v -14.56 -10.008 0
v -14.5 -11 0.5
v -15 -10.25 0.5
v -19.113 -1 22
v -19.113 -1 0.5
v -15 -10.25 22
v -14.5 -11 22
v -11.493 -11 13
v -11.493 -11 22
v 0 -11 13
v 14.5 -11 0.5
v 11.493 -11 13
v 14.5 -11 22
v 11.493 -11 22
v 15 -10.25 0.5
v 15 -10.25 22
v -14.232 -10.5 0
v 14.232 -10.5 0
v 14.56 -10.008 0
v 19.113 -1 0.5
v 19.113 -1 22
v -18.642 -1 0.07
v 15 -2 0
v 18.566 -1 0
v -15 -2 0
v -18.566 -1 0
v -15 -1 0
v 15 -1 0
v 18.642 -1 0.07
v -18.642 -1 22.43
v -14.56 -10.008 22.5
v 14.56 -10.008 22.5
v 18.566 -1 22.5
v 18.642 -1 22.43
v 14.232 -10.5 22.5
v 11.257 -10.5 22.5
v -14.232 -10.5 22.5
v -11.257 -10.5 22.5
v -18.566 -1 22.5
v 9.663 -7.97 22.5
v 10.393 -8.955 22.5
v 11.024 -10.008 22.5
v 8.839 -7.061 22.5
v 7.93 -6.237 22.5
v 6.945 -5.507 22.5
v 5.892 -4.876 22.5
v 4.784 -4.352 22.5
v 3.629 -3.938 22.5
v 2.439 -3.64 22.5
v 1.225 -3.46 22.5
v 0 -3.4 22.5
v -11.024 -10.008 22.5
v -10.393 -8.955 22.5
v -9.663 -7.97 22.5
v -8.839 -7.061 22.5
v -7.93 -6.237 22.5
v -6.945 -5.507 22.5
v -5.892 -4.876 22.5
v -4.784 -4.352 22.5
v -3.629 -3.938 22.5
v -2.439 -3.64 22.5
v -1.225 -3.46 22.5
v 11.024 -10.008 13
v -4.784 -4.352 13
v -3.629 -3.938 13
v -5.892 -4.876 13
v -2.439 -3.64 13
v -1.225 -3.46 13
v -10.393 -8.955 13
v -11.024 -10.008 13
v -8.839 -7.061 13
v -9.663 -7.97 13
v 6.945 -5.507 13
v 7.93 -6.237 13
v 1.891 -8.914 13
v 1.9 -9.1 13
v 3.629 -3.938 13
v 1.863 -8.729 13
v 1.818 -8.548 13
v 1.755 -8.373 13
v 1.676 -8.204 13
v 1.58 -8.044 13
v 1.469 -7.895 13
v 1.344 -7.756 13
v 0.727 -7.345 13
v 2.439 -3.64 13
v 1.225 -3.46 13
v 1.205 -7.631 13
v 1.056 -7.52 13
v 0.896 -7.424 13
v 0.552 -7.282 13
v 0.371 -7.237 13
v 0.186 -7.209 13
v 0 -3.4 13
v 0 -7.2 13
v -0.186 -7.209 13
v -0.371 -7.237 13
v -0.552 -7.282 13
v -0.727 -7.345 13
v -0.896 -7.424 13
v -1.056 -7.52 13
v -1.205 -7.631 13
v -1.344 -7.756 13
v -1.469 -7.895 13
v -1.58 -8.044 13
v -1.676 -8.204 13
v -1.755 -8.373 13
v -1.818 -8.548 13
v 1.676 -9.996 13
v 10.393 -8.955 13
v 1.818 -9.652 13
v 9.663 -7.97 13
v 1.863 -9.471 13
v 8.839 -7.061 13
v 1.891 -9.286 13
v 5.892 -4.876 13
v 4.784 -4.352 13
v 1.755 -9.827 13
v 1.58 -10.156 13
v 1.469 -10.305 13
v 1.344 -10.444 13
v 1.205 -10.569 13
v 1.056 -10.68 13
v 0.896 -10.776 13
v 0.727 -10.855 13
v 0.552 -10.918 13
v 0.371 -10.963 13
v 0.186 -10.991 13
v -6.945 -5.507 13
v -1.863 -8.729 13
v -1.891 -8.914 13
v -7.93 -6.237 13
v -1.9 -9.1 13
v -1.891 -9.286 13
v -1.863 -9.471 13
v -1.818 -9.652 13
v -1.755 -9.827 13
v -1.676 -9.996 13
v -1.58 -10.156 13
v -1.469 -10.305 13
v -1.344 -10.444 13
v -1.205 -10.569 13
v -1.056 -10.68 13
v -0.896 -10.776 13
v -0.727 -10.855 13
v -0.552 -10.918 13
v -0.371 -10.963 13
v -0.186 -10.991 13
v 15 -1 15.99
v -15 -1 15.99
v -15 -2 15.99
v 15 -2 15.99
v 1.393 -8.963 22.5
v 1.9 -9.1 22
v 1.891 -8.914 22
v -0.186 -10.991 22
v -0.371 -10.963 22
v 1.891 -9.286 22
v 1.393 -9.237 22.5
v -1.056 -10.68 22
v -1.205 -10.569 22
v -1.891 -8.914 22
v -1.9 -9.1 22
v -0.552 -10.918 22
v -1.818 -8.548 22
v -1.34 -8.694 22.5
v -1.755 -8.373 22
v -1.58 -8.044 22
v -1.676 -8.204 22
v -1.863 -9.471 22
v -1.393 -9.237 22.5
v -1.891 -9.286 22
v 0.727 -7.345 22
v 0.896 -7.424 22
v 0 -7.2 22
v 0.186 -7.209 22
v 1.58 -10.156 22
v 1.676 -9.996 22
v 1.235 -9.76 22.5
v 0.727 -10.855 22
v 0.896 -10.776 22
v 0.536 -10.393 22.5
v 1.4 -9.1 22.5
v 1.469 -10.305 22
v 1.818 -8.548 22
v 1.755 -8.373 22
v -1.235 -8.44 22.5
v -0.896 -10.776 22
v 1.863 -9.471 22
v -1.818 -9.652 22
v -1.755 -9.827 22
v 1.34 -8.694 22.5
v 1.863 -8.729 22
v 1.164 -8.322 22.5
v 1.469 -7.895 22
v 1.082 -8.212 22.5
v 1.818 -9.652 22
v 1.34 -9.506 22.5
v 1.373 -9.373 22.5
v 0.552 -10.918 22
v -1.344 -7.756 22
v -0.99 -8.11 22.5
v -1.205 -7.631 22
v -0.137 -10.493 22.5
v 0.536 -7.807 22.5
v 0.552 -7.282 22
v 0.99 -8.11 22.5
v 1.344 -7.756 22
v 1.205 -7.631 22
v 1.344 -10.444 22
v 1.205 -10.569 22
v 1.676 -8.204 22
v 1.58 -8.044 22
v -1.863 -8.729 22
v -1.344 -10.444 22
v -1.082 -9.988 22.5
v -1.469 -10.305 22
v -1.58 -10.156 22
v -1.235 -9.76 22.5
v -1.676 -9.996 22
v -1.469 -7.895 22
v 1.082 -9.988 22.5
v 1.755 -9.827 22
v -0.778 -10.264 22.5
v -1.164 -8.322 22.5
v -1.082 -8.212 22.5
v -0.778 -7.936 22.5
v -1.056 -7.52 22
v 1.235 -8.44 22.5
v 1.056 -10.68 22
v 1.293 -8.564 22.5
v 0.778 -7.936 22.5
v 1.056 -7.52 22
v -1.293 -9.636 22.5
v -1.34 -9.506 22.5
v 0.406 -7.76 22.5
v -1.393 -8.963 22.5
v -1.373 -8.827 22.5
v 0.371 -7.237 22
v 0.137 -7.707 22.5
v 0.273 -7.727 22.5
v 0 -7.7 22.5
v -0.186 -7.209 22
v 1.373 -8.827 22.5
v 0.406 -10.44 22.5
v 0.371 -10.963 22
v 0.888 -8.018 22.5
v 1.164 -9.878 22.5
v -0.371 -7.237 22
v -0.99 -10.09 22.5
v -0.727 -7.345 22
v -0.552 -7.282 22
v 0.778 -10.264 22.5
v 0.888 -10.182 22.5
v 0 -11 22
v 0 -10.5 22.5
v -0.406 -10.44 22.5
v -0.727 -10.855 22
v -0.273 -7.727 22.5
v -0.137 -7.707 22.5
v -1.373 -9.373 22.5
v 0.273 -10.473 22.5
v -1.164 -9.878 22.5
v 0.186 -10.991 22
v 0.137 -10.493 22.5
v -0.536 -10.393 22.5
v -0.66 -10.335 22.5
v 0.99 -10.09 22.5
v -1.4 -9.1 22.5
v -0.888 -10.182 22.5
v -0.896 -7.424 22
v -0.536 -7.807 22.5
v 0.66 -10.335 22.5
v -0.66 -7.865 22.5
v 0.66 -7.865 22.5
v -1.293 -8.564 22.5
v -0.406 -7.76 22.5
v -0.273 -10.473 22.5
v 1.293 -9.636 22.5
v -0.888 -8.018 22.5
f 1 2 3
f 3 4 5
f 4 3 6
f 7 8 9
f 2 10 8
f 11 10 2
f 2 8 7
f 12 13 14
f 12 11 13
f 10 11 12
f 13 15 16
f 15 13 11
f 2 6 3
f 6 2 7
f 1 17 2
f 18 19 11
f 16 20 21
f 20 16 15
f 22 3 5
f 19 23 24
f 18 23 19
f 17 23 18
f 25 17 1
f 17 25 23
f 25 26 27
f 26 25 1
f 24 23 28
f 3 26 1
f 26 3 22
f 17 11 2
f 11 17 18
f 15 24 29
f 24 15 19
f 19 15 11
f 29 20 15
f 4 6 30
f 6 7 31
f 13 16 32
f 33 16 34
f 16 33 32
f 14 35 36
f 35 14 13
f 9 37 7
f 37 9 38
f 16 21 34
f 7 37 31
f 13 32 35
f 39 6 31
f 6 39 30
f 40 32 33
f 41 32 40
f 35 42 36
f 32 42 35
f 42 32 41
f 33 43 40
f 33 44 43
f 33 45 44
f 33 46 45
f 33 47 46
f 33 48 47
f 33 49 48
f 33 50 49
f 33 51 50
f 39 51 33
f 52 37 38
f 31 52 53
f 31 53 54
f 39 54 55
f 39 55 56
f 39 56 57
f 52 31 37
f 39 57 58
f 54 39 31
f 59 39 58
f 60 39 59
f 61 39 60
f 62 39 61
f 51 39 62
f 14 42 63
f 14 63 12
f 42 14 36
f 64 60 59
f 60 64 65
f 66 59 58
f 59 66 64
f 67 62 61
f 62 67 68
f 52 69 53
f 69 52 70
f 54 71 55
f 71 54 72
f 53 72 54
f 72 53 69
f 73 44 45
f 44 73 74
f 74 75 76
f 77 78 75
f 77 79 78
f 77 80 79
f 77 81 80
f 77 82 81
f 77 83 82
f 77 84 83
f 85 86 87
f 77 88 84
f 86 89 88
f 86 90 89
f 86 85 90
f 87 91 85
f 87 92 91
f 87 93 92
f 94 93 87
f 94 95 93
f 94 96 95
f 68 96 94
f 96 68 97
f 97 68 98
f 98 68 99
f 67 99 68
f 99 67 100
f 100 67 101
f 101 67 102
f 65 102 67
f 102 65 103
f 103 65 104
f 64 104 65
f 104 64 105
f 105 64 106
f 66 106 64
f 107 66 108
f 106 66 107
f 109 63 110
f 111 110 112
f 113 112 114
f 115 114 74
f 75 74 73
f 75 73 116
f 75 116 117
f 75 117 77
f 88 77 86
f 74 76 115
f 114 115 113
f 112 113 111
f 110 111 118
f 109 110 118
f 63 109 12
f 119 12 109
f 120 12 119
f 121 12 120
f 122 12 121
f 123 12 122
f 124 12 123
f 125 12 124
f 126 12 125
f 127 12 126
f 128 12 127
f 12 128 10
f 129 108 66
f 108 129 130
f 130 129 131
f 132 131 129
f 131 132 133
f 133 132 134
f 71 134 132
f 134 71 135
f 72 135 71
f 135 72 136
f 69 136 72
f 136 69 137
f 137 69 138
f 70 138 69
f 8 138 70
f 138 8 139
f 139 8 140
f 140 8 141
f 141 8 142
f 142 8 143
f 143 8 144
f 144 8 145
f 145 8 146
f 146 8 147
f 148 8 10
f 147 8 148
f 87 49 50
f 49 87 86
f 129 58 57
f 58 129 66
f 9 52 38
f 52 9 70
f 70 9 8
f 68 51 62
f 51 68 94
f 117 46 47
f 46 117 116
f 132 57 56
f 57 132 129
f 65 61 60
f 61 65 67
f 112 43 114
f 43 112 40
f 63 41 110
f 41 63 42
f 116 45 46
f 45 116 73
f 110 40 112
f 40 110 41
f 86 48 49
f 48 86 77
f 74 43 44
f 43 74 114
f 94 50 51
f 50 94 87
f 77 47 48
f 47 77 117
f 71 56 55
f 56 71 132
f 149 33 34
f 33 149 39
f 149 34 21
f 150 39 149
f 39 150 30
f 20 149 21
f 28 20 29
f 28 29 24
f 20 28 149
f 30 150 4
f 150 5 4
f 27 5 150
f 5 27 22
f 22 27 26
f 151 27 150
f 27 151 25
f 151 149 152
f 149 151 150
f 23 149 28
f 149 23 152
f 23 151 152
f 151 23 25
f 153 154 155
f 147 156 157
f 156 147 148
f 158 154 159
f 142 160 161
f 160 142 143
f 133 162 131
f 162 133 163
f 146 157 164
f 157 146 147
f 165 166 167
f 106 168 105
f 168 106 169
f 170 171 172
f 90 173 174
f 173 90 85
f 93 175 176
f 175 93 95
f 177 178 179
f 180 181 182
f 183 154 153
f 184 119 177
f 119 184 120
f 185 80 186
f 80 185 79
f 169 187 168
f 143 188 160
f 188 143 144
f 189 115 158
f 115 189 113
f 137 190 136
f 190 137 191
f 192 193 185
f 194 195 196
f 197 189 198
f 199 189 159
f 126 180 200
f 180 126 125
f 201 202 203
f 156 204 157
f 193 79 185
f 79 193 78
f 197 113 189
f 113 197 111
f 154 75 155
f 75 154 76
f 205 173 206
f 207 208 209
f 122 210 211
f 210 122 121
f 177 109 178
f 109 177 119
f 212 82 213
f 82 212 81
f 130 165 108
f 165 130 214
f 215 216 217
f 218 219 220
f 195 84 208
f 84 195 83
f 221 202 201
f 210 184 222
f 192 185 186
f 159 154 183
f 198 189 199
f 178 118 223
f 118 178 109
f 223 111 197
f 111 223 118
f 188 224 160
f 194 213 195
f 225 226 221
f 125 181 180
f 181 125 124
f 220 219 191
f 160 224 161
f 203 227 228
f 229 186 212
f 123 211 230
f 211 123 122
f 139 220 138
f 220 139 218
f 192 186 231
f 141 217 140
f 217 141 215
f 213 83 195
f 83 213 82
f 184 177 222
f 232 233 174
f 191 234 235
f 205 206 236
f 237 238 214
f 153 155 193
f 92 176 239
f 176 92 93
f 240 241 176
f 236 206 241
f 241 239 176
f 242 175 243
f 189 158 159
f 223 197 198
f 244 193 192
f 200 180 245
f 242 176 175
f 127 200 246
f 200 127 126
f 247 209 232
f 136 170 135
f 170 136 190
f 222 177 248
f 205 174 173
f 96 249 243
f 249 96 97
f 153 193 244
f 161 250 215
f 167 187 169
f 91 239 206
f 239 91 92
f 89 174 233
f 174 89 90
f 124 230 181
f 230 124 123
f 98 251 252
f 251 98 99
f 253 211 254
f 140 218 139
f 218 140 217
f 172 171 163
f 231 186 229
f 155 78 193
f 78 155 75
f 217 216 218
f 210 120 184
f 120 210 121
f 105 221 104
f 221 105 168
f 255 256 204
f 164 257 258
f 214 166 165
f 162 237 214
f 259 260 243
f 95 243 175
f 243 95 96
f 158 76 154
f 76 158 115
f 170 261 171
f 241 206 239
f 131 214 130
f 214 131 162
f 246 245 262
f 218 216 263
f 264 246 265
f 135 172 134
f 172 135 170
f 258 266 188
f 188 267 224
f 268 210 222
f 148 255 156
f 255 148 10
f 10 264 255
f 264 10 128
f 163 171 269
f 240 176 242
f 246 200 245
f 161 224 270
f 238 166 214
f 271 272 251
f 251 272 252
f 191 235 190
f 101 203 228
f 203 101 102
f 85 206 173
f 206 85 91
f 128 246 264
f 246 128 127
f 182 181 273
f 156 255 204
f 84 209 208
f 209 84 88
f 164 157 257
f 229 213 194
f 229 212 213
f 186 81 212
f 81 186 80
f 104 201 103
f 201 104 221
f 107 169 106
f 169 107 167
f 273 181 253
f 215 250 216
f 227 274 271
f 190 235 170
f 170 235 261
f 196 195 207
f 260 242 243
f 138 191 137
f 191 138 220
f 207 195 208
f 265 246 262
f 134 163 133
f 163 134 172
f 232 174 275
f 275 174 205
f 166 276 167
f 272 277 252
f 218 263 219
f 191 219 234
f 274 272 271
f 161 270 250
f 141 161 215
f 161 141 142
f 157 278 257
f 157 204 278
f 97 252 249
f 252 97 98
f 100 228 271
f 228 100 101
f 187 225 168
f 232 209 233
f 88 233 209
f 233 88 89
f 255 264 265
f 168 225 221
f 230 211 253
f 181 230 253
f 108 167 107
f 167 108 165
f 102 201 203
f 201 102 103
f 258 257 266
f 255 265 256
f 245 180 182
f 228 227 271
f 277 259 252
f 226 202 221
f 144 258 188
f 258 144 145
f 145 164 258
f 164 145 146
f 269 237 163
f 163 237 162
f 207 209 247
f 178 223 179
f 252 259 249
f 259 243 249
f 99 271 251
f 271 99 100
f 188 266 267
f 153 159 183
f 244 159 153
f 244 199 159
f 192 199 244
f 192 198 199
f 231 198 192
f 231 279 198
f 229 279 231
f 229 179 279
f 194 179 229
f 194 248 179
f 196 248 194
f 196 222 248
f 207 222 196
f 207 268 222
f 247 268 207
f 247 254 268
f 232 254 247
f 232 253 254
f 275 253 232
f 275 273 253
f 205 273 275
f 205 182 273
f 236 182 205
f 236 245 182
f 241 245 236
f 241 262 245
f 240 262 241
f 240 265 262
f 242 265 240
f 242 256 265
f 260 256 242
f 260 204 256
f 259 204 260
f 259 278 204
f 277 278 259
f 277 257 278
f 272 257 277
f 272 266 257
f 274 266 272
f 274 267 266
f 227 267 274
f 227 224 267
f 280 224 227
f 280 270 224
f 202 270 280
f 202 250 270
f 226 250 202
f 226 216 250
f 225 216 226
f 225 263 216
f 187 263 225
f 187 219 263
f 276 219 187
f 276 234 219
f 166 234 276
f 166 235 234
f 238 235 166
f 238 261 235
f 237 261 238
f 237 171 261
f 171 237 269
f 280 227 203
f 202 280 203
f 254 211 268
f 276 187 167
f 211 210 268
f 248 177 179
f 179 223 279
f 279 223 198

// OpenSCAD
// Towhook Module (Playmobil compatible) for Toy Transporter
// https://www.thingiverse.com/thing:3526023
// by Bikecyclist: 
// https://www.thingiverse.com/Bikecyclist
//
// Remix of/suitable for:
// Toy-Transporter
// https://www.thingiverse.com/thing:3449335
// by Schwiizer:
// https://www.thingiverse.com/Schwiizer

// Depth of the towhook module
dpt = 11;

// Small distance to ensure proper meshing
eps = 0.01;

// Diameter of cutout
d_cutout = 25;

// Diameter of hook
d_hook = 3.8;

// Length of hook
l_hook = 9.5;

// Distance the hook is behind the back plate
y_hook = 11;

// Height of hook
h_hook = 13;

// Extra width of the mounting block at the back of the truck
xw = 10;

// Total height of the mounting block
hh = 21.5;

// Number of facets
$fn = 64;

rotate ([0, 0, 180])
towhook ();

module towhook ()
{
    {
        difference ()
        {
            union ()
            {
                hull ()
                {
                    towblock (hh, xw);
                    
                    linear_extrude (eps)
                    offset (-0.5)
                    projection (cut = false)
                    towblock (hh, xw);
                }
                
                hull ()
                {
                    towblock (hh, xw);
                    
                    translate ([0, 0, hh - eps + 1])
                    linear_extrude (eps)
                    offset (-0.5)
                    projection (cut = true)
                    translate ([0, 0, -hh + eps])
                    towblock (hh, xw);
                }
            }
            
            translate ([0, d_cutout/2 + y_hook - 2 * d_hook, h_hook])
            cylinder (d = d_cutout, h = l_hook + eps);
            
            translate ([0, -1, h_hook - eps])
            cube ([32 + xw + 2 * eps, 4, 26], center = true);
            
            translate ([0, 0, 16/2 - eps])
            cube ([30, 4, 16], center = true);
        }
        
        hull ()
        {
            translate ([0, y_hook - d_hook/2, h_hook])
            cylinder (d = d_hook, h = l_hook - 0.5);
            
            translate ([0, y_hook - d_hook/2, h_hook])
            cylinder (d = d_hook - 1, h = l_hook);
        }
    }
}

module towblock (hh, xw = 0)
{
    hull ()
    {
        translate ([0, -1, hh/2 + 0.5])
        cube ([30 + xw, eps, hh], center = true);
        
        translate ([0, (dpt - 1)/2, hh/2 + 0.5])
        cube ([30, dpt - 0.5, hh], center = true);
            
        translate ([0, dpt/2, hh/2 + 0.5])
        cube ([29, dpt, hh], center = true);
    }
}
